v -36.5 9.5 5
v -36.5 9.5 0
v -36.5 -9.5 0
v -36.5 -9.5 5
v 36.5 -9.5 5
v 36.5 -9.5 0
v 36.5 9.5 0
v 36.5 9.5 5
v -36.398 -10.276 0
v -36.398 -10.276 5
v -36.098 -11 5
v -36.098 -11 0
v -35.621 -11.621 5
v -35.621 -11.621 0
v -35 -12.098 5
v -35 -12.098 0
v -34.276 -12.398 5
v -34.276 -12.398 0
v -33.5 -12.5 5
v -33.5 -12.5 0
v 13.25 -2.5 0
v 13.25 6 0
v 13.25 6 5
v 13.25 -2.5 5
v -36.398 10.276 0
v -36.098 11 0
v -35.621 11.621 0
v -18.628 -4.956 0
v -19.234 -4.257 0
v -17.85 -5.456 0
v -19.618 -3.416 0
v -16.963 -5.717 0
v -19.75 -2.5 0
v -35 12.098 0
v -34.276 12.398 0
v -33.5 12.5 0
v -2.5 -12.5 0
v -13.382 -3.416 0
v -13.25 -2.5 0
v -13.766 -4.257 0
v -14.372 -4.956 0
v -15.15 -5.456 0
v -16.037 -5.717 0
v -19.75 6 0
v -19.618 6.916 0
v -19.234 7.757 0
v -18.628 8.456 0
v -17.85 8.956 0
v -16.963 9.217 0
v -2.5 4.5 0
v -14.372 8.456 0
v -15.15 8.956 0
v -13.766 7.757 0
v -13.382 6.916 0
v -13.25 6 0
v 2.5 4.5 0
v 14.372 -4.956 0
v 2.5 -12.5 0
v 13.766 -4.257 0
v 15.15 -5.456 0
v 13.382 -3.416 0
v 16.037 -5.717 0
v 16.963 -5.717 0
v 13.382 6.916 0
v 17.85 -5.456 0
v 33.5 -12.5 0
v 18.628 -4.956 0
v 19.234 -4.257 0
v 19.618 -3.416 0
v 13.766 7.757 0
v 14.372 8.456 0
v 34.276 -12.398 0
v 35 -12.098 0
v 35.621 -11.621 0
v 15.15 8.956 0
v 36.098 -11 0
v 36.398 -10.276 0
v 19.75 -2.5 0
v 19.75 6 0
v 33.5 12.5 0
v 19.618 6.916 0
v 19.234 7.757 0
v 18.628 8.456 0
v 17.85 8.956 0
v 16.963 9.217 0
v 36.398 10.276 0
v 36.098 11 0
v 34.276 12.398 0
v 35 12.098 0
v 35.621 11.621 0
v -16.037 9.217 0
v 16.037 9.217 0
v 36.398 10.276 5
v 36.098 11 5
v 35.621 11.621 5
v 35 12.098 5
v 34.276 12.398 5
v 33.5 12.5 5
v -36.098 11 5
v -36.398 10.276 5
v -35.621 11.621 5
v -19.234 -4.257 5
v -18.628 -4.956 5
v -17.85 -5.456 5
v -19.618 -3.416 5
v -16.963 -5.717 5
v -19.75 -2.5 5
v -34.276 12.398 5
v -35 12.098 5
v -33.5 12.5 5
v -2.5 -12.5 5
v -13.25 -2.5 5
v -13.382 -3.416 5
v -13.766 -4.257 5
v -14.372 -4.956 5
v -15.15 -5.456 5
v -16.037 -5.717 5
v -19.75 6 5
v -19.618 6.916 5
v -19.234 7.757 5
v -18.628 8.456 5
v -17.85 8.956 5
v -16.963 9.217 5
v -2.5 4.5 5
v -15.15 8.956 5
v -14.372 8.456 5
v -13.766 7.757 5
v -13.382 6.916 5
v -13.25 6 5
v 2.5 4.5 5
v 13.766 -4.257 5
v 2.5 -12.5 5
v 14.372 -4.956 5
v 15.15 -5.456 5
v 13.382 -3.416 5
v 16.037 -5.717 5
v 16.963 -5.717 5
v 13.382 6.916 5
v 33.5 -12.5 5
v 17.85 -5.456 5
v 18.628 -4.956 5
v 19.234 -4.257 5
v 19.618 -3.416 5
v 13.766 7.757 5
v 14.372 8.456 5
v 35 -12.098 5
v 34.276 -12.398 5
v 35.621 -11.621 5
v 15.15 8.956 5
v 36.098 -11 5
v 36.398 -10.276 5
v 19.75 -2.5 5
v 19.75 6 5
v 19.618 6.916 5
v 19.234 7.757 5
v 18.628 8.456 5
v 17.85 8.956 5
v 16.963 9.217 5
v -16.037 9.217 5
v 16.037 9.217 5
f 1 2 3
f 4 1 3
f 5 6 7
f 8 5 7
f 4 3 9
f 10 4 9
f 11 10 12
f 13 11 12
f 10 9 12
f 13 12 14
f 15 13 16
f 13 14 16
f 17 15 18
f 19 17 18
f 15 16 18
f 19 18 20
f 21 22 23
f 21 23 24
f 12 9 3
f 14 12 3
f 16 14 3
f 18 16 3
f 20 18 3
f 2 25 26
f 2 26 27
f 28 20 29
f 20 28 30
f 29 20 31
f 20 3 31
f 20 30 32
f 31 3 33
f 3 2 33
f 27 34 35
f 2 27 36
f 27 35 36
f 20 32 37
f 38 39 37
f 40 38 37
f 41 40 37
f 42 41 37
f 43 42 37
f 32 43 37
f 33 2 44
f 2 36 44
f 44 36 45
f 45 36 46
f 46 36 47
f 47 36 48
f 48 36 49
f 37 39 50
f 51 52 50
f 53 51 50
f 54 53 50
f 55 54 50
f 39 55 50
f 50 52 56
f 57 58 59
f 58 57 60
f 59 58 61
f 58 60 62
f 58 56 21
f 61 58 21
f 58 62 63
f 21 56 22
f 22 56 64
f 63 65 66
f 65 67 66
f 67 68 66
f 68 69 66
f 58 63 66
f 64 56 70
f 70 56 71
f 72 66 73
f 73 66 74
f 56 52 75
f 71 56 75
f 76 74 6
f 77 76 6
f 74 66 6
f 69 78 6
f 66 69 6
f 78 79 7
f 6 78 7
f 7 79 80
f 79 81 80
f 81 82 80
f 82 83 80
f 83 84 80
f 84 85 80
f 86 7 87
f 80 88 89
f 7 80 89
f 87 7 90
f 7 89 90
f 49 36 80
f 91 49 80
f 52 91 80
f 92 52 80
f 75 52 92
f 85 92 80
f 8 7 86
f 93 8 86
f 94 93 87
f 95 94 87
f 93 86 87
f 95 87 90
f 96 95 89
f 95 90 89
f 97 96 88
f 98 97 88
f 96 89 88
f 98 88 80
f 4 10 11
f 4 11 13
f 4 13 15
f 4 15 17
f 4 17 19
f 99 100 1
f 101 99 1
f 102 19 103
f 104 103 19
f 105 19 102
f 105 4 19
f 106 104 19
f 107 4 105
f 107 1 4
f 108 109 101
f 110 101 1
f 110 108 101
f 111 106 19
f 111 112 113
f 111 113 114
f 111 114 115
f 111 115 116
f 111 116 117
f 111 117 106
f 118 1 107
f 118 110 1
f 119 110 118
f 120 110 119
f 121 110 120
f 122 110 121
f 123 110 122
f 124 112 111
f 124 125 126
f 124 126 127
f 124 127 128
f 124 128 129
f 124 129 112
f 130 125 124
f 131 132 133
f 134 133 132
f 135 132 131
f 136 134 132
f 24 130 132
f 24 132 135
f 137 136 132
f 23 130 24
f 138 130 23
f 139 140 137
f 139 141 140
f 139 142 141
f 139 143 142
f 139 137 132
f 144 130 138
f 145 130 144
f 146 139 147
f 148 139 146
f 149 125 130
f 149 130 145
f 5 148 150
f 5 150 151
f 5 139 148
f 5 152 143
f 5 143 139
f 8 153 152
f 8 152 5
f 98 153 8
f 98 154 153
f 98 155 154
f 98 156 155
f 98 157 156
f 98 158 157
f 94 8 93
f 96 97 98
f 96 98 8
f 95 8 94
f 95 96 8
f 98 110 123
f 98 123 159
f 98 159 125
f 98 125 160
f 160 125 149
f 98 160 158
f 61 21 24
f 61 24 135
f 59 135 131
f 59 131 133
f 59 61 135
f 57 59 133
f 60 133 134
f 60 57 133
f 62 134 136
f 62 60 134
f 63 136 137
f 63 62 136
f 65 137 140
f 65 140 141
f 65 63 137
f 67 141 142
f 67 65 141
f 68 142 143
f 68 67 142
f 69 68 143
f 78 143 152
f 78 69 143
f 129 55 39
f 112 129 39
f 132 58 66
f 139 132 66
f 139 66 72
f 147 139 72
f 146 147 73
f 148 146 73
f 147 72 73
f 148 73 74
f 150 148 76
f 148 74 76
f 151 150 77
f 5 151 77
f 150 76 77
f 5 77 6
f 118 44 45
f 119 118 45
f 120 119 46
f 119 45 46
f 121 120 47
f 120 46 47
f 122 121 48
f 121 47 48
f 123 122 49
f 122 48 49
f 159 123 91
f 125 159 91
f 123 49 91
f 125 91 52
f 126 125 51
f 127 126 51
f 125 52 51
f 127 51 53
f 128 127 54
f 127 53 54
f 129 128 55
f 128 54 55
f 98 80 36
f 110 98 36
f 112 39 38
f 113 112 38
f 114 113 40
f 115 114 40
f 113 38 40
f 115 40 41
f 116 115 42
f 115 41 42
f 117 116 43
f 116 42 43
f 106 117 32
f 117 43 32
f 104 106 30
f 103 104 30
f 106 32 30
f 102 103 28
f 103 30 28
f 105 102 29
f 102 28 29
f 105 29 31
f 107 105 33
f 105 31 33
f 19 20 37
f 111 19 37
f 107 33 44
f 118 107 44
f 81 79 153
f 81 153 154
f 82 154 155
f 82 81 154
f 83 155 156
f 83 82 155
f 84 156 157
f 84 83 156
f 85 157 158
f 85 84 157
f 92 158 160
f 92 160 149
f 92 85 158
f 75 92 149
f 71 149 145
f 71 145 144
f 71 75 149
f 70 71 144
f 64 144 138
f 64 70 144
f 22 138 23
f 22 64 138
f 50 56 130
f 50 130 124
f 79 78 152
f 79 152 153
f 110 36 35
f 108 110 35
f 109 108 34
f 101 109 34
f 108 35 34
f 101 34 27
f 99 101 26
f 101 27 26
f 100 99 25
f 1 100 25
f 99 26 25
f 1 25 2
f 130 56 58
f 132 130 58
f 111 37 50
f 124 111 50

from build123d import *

# Parameters (mm, degrees)
EXTRUDE_1_DEPTH     = 5
SKETCH_3_W          = 5
SKETCH_3_H          = 2
CUT_EXTRUDE_2_DEPTH = 10


with BuildPart() as part:
    # 草图1 → 凸台-拉伸1 (new body)
    with BuildSketch(Plane.XY):
        with BuildLine():
            Line((36.5, -9.5), (36.5, 9.5))
            ThreePointArc((36.5, 9.5), (35.621320344, 11.621320344), (33.5, 12.5))
            Line((33.5, 12.5), (-33.5, 12.5))
            ThreePointArc((-33.5, 12.5), (-35.621320344, 11.621320344), (-36.5, 9.5))
            Line((-36.5, 9.5), (-36.5, -9.5))
            ThreePointArc((-36.5, -9.5), (-35.621320344, -11.621320344), (-33.5, -12.5))
            Line((-33.5, -12.5), (-2.5, -12.5))
            Line((-2.5, -12.5), (-2.5, 2.5))
            Line((-2.5, 2.5), (2.5, 2.5))
            Line((2.5, 2.5), (2.5, -12.5))
            Line((2.5, -12.5), (33.5, -12.5))
            ThreePointArc((33.5, -12.5), (35.621320344, -11.621320344), (36.5, -9.5))
        make_face()
        with BuildLine():
            Line((-19.75, -2.5), (-19.75, 6))
            ThreePointArc((-19.75, 6), (-16.5, 9.25), (-13.25, 6))
            Line((-13.25, 6), (-13.25, -2.5))
            ThreePointArc((-13.25, -2.5), (-16.5, -5.75), (-19.75, -2.5))
        make_face(mode=Mode.SUBTRACT)
        with BuildLine():
            Line((19.75, -2.5), (19.75, 6))
            ThreePointArc((19.75, 6), (16.5, 9.25), (13.25, 6))
            Line((13.25, 6), (13.25, -2.5))
            ThreePointArc((13.25, -2.5), (16.5, -5.75), (19.75, -2.5))
        make_face(mode=Mode.SUBTRACT)
    extrude(amount=EXTRUDE_1_DEPTH)

    # 草图3 → 切除-拉伸2 (cut)
    with BuildSketch(Plane(origin=(0, 0, 0), x_dir=(-1, 0, 0), z_dir=(0, 0, -1))):
        with Locations((0, 3.5)):
            Rectangle(SKETCH_3_W, SKETCH_3_H)
    extrude(amount=-CUT_EXTRUDE_2_DEPTH, mode=Mode.SUBTRACT)


solid = part.part
